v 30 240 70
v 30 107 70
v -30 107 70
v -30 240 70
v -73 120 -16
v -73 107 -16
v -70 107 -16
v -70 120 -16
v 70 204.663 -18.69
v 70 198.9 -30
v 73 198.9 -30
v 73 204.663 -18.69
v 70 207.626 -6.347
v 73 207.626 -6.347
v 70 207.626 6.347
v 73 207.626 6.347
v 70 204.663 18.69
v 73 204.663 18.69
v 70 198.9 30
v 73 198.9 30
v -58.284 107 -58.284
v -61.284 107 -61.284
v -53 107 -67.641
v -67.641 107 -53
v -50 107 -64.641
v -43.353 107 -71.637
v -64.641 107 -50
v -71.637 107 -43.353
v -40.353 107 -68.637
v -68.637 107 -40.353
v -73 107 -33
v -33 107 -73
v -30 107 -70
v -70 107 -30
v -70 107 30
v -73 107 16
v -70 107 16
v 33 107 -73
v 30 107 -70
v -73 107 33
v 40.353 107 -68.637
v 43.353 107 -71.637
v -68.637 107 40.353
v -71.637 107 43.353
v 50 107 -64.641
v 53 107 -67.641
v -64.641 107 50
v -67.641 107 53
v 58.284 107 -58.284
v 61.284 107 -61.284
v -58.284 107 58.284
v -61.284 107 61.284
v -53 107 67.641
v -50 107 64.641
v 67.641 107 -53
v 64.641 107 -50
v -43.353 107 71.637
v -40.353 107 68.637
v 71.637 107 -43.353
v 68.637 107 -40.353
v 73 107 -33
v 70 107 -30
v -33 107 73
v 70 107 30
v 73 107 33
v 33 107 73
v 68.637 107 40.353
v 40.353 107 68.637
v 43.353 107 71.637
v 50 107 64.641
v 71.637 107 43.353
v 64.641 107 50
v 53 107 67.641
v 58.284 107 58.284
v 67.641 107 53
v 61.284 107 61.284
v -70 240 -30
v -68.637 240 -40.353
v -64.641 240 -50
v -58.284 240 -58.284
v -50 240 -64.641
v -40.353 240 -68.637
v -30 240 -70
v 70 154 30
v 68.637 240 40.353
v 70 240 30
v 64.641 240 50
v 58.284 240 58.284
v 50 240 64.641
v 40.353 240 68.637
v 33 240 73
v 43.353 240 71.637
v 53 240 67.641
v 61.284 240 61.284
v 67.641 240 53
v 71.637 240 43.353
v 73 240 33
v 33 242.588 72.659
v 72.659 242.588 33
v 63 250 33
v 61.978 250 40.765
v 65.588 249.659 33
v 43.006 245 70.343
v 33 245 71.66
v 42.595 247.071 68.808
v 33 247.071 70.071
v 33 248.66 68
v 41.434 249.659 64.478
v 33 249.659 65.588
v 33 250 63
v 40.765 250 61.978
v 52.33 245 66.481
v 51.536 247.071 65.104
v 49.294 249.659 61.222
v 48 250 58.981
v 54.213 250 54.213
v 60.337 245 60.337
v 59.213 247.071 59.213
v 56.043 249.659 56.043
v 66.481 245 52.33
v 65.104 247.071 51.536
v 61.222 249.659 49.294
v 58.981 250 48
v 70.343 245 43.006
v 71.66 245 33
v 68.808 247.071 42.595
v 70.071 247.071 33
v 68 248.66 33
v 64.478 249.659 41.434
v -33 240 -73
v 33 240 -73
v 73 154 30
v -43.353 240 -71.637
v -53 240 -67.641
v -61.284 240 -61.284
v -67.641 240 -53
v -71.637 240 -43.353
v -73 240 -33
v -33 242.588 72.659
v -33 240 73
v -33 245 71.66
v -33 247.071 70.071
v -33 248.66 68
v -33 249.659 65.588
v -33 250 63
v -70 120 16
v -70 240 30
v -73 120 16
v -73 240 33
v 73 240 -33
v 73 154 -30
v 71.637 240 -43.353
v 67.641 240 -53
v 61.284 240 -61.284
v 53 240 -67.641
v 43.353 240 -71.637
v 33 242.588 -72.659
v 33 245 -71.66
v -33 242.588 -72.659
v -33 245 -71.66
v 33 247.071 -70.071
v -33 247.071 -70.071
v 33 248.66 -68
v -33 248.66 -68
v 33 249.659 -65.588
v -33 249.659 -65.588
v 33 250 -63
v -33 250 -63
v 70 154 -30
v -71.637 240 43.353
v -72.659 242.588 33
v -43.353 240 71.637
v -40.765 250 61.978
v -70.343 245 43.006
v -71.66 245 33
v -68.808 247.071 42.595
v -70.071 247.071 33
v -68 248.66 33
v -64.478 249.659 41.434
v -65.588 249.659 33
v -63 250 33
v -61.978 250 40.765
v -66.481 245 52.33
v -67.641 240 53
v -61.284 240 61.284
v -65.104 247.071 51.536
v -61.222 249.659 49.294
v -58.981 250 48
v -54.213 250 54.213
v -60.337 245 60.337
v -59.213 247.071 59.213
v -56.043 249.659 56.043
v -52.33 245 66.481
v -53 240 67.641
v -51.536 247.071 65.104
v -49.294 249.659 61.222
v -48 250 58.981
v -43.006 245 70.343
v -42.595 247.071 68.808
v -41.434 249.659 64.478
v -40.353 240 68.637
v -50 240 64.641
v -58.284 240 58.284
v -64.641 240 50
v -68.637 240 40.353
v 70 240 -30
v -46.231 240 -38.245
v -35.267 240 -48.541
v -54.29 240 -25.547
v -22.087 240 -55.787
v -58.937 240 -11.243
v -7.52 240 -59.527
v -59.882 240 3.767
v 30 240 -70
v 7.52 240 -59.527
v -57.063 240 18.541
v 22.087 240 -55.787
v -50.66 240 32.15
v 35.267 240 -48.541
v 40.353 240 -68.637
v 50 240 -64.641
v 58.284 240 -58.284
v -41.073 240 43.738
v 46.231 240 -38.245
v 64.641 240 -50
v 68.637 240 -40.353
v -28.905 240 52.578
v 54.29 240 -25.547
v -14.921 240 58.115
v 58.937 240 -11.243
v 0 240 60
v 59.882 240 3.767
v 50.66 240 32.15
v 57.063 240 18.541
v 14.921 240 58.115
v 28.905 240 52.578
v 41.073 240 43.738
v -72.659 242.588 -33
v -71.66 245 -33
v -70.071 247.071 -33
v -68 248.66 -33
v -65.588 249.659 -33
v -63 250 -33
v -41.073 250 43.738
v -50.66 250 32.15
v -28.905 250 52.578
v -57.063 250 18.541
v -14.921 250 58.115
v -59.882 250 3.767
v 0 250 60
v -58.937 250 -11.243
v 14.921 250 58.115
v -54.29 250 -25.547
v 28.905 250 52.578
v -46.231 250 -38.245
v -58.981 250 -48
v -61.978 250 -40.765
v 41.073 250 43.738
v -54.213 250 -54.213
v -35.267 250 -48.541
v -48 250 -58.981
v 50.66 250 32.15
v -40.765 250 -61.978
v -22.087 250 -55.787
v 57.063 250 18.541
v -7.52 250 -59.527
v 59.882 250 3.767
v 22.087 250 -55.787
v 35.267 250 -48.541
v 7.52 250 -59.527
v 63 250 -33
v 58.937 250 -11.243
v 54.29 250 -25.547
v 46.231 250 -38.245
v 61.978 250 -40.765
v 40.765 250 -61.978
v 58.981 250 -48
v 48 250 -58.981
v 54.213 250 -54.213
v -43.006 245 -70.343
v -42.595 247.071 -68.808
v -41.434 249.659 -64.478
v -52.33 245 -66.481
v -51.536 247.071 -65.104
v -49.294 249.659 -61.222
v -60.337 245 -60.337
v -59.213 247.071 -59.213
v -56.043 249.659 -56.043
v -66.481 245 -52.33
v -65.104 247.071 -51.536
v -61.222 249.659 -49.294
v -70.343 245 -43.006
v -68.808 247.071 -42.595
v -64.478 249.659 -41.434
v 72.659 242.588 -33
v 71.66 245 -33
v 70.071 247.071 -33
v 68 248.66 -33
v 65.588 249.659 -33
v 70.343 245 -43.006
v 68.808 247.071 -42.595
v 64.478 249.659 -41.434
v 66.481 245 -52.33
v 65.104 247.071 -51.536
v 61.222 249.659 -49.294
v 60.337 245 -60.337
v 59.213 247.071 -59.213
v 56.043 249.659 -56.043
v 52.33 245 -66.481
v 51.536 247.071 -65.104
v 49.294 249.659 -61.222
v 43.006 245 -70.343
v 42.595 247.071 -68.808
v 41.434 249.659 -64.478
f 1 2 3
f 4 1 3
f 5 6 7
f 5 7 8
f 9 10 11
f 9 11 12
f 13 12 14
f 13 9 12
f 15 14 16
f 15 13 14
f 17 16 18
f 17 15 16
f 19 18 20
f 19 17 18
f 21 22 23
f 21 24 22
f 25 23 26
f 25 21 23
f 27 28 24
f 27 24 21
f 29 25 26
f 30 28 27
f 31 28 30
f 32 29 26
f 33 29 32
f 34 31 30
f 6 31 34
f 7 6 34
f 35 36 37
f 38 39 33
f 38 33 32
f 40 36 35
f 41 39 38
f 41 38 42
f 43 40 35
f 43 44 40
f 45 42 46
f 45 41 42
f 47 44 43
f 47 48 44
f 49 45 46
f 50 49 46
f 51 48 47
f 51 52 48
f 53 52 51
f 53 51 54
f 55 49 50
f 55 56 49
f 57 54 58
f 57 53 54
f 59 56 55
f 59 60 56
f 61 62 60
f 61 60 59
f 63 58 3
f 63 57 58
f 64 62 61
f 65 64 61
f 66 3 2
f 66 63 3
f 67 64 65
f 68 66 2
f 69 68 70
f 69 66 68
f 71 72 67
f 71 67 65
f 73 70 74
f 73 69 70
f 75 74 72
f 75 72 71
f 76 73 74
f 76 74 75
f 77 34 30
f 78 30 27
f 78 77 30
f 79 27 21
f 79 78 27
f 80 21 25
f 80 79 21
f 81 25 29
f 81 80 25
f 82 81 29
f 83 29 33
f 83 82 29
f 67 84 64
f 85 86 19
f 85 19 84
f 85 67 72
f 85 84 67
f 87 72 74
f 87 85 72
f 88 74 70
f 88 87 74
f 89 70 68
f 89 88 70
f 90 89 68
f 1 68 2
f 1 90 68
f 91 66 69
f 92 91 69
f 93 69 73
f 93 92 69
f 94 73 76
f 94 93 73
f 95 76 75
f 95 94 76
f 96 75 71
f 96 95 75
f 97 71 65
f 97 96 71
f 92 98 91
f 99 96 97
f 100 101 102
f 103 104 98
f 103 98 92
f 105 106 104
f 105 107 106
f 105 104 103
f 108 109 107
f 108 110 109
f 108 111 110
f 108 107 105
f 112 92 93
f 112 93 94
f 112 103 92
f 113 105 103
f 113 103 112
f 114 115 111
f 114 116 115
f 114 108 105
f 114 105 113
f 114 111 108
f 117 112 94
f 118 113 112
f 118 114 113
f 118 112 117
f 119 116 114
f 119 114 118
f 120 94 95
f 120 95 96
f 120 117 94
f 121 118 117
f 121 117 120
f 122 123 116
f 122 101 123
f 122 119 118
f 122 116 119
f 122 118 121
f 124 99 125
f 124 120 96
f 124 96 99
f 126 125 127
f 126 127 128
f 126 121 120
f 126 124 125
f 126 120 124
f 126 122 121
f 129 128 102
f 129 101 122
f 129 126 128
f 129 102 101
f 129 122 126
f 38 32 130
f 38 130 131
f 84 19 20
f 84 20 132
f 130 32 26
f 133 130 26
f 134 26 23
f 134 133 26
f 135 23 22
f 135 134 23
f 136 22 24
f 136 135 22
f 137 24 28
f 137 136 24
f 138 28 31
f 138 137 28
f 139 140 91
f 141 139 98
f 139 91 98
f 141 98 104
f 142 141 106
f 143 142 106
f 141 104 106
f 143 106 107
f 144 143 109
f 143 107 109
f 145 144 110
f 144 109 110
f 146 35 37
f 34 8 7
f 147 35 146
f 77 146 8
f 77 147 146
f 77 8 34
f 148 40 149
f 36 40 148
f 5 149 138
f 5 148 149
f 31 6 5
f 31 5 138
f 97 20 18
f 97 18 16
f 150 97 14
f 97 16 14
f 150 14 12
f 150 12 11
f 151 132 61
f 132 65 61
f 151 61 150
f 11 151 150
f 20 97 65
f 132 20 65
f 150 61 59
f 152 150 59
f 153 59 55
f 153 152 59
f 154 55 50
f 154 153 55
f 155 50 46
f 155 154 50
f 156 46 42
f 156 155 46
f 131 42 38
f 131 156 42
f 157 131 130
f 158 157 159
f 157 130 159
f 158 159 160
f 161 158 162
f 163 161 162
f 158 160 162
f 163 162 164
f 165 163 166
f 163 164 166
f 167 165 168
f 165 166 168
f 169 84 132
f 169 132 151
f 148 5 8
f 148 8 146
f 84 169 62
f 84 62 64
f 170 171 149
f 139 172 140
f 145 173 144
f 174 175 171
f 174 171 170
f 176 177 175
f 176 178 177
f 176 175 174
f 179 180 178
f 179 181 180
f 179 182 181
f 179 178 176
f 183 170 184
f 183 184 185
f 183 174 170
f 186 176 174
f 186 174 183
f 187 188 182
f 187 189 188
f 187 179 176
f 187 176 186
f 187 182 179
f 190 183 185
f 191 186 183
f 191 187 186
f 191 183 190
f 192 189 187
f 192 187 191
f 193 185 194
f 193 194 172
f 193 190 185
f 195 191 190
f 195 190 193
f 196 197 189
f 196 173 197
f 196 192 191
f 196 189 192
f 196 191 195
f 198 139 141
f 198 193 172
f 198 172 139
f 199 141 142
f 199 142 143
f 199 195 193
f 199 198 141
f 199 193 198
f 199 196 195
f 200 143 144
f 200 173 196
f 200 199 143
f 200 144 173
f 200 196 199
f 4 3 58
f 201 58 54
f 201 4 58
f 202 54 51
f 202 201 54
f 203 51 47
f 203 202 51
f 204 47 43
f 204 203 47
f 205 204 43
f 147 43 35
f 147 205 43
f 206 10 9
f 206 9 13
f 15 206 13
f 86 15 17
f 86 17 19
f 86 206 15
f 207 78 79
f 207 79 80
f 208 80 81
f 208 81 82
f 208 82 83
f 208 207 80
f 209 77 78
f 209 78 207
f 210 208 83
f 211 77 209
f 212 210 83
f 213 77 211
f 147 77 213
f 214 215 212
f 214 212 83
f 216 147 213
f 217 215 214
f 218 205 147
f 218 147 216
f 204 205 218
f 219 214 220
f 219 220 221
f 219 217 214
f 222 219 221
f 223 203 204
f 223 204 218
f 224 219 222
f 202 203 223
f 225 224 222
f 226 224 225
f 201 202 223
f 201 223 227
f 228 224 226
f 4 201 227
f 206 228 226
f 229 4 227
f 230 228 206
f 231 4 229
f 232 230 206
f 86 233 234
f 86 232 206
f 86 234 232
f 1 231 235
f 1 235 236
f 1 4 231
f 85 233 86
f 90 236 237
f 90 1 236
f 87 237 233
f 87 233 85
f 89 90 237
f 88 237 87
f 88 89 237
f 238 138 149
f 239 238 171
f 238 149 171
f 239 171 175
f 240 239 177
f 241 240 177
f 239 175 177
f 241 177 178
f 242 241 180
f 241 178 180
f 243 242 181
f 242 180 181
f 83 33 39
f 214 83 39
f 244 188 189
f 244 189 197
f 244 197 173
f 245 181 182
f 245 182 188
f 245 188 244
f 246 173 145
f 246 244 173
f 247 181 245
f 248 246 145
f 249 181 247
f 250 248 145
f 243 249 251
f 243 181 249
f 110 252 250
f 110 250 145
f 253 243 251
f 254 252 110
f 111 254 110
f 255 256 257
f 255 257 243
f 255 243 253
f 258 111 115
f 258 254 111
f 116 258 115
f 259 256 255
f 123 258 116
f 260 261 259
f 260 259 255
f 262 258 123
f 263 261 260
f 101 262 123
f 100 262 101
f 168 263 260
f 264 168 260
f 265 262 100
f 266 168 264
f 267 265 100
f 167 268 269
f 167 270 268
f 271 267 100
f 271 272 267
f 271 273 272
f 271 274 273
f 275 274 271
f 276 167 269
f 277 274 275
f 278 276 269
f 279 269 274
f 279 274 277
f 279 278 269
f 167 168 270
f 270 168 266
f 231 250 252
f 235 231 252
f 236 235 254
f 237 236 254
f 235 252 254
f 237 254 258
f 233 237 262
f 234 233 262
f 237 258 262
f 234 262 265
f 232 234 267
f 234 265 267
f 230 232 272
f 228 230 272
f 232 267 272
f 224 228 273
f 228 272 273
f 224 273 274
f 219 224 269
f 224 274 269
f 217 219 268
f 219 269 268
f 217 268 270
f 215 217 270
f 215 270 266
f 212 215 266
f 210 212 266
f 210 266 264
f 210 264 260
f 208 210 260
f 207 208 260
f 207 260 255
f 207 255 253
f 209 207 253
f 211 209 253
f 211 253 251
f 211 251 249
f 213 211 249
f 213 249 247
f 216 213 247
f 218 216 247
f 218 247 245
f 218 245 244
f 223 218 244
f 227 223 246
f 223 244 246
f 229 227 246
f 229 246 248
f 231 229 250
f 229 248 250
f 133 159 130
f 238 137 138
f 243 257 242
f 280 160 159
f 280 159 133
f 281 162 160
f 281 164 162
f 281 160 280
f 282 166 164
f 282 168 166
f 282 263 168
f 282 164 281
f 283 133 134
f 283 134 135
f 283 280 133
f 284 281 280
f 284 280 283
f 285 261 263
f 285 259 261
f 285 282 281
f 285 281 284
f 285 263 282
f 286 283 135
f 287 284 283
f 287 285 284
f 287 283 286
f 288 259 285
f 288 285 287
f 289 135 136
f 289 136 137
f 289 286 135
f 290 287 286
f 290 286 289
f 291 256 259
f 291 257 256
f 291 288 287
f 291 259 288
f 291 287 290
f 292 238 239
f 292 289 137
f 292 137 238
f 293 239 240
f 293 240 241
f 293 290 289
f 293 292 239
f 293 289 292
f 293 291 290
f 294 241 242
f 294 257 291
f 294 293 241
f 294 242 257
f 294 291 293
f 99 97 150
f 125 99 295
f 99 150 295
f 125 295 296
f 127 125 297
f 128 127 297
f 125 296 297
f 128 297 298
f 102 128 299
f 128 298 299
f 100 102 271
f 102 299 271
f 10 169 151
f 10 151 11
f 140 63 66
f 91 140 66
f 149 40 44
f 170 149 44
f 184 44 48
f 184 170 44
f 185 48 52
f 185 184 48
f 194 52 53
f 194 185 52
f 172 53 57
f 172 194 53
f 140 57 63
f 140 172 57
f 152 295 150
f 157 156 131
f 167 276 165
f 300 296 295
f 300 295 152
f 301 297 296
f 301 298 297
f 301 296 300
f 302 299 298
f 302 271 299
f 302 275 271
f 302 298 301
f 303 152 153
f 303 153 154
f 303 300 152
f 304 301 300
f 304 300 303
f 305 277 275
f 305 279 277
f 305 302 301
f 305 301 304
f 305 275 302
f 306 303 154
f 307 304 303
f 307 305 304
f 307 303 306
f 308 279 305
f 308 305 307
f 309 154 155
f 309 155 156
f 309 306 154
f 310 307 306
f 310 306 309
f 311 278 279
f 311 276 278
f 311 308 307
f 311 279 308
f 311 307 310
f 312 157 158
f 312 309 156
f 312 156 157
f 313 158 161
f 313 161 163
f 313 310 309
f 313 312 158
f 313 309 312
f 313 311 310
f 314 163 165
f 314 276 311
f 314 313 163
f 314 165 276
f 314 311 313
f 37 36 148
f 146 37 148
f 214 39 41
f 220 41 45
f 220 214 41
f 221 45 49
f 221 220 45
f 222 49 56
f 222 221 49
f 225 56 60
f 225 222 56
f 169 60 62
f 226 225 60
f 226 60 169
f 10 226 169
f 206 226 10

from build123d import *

# Parameters (mm, degrees)
SKETCH5_W           = 146
SKETCH5_H           = 146
BOSS_EXTRUDE2_DEPTH = 250
FILLET8_R           = 40
FILLET9_R           = 40
FILLET10_R          = 40
FILLET11_R          = 40
FILLET12_R          = 10
BOSS_EXTRUDE5_START = -240
BOSS_EXTRUDE5_DEPTH = 240
SKETCH8_R           = 60
CUT_EXTRUDE1_DEPTH  = 34
SKETCH10_W          = 44
SKETCH10_H          = 33
CUT_EXTRUDE2_DEPTH  = 3
CUT_EXTRUDE3_DEPTH  = 3
SKETCH12_W          = 157.188162186
SKETCH12_H          = 158.114359626
CUT_EXTRUDE4_DEPTH  = 107
SKETCH15_W          = 32
SKETCH15_H          = 13
CUT_EXTRUDE7_DEPTH  = 5
CUT_EXTRUDE9_DEPTH  = 5


# Read off the part's stored shape, not the designer's step: Boss-Extrude5
with BuildPart() as part:
    # Sketch5 → Boss-Extrude2 (new body)
    with BuildSketch(Plane(origin=(0, 0, 0), x_dir=(1, 0, 0), z_dir=(0, 1, 0))):
        Rectangle(SKETCH5_W, SKETCH5_H)
    extrude(amount=BOSS_EXTRUDE2_DEPTH)

    # Fillet8
    fillet8_edges = [part.edges().sort_by_distance(p)[0] for p in [
        (73, 125, 73),
    ]]
    fillet(fillet8_edges, radius=FILLET8_R)

    # Fillet9
    fillet9_edges = [part.edges().sort_by_distance(p)[0] for p in [
        (73, 125, -73),
    ]]
    fillet(fillet9_edges, radius=FILLET9_R)

    # Fillet10
    fillet10_edges = [part.edges().sort_by_distance(p)[0] for p in [
        (-73, 125, -73),
    ]]
    fillet(fillet10_edges, radius=FILLET10_R)

    # Fillet11
    fillet11_edges = [part.edges().sort_by_distance(p)[0] for p in [
        (-73, 125, 73),
    ]]
    fillet(fillet11_edges, radius=FILLET11_R)

    # Fillet12
    fillet12_edges = [part.edges().sort_by_distance(p)[0] for p in [
        (73, 250, 0),
        (61.284271247, 250, 61.284271247),
        (0, 250, -73),
        (61.284271247, 250, -61.284271247),
        (-73, 250, 0),
        (-61.284271247, 250, -61.284271247),
        (0, 250, 73),
        (-61.284271247, 250, 61.284271247),
    ]]
    fillet(fillet12_edges, radius=FILLET12_R)

    # Boss-Extrude5 outline → Boss-Extrude5 (cut)
    with BuildSketch(Plane.XZ.offset(BOSS_EXTRUDE5_START)):
        with BuildLine():
            Line((30, 70), (-30, 70))
            ThreePointArc((-30, 70), (-58.284271247, 58.284271247), (-70, 30))
            Line((-70, 30), (-70, -30))
            ThreePointArc((-70, -30), (-58.284271247, -58.284271247), (-30, -70))
            Line((-30, -70), (30, -70))
            ThreePointArc((30, -70), (58.284271247, -58.284271247), (70, -30))
            Line((70, -30), (70, 30))
            ThreePointArc((70, 30), (58.284271247, 58.284271247), (30, 70))
        make_face()
    extrude(amount=BOSS_EXTRUDE5_DEPTH, mode=Mode.SUBTRACT)

    # Sketch8 → Cut-Extrude1 (cut)
    with BuildSketch(Plane(origin=(0, 250, 0), x_dir=(1, 0, 0), z_dir=(0, 1, 0))):
        with Locations(Location((0, 0, 0), (0, 0, 270))):
            Circle(SKETCH8_R)
    extrude(amount=-CUT_EXTRUDE1_DEPTH, mode=Mode.SUBTRACT)

    # Sketch10 → Cut-Extrude2 (cut)
    with BuildSketch(Plane(origin=(73, 0, 0), x_dir=(0, 0, -1), z_dir=(1, 0, 0))):
        with Locations((0, 63.5)):
            Rectangle(SKETCH10_W, SKETCH10_H)
    extrude(amount=-CUT_EXTRUDE2_DEPTH, mode=Mode.SUBTRACT)

    # Sketch11 → Cut-Extrude3 (cut)
    with BuildSketch(Plane.ZY.offset(73)):
        Polygon((0, 0), (-16, 0), (-16, 13), (16, 13), (16, 0), align=None)
    extrude(amount=-CUT_EXTRUDE3_DEPTH, mode=Mode.SUBTRACT)

    # Sketch12 → Cut-Extrude4 (cut)
    with BuildSketch(Plane.XZ):
        with Locations((-1.675039252, -2.437620076)):
            Rectangle(SKETCH12_W, SKETCH12_H)
    extrude(amount=-CUT_EXTRUDE4_DEPTH, mode=Mode.SUBTRACT)

    # Sketch15 → Cut-Extrude7 (cut)
    with BuildSketch(Plane.ZY.offset(73)):
        with Locations((0, 113.5)):
            Rectangle(SKETCH15_W, SKETCH15_H)
    extrude(amount=-CUT_EXTRUDE7_DEPTH, mode=Mode.SUBTRACT)

    # Sketch17 → Cut-Extrude9 (cut)
    with BuildSketch(Plane.ZY.offset(-70)):
        with BuildLine():
            Line((30, 154), (-30, 154))
            Line((-30, 154), (-30, 198.899888641))
            ThreePointArc((-30, 198.899888641), (0, 208), (30, 198.899888641))
            Line((30, 198.899888641), (30, 154))
        make_face()
    extrude(amount=-CUT_EXTRUDE9_DEPTH, mode=Mode.SUBTRACT)


solid = part.part
